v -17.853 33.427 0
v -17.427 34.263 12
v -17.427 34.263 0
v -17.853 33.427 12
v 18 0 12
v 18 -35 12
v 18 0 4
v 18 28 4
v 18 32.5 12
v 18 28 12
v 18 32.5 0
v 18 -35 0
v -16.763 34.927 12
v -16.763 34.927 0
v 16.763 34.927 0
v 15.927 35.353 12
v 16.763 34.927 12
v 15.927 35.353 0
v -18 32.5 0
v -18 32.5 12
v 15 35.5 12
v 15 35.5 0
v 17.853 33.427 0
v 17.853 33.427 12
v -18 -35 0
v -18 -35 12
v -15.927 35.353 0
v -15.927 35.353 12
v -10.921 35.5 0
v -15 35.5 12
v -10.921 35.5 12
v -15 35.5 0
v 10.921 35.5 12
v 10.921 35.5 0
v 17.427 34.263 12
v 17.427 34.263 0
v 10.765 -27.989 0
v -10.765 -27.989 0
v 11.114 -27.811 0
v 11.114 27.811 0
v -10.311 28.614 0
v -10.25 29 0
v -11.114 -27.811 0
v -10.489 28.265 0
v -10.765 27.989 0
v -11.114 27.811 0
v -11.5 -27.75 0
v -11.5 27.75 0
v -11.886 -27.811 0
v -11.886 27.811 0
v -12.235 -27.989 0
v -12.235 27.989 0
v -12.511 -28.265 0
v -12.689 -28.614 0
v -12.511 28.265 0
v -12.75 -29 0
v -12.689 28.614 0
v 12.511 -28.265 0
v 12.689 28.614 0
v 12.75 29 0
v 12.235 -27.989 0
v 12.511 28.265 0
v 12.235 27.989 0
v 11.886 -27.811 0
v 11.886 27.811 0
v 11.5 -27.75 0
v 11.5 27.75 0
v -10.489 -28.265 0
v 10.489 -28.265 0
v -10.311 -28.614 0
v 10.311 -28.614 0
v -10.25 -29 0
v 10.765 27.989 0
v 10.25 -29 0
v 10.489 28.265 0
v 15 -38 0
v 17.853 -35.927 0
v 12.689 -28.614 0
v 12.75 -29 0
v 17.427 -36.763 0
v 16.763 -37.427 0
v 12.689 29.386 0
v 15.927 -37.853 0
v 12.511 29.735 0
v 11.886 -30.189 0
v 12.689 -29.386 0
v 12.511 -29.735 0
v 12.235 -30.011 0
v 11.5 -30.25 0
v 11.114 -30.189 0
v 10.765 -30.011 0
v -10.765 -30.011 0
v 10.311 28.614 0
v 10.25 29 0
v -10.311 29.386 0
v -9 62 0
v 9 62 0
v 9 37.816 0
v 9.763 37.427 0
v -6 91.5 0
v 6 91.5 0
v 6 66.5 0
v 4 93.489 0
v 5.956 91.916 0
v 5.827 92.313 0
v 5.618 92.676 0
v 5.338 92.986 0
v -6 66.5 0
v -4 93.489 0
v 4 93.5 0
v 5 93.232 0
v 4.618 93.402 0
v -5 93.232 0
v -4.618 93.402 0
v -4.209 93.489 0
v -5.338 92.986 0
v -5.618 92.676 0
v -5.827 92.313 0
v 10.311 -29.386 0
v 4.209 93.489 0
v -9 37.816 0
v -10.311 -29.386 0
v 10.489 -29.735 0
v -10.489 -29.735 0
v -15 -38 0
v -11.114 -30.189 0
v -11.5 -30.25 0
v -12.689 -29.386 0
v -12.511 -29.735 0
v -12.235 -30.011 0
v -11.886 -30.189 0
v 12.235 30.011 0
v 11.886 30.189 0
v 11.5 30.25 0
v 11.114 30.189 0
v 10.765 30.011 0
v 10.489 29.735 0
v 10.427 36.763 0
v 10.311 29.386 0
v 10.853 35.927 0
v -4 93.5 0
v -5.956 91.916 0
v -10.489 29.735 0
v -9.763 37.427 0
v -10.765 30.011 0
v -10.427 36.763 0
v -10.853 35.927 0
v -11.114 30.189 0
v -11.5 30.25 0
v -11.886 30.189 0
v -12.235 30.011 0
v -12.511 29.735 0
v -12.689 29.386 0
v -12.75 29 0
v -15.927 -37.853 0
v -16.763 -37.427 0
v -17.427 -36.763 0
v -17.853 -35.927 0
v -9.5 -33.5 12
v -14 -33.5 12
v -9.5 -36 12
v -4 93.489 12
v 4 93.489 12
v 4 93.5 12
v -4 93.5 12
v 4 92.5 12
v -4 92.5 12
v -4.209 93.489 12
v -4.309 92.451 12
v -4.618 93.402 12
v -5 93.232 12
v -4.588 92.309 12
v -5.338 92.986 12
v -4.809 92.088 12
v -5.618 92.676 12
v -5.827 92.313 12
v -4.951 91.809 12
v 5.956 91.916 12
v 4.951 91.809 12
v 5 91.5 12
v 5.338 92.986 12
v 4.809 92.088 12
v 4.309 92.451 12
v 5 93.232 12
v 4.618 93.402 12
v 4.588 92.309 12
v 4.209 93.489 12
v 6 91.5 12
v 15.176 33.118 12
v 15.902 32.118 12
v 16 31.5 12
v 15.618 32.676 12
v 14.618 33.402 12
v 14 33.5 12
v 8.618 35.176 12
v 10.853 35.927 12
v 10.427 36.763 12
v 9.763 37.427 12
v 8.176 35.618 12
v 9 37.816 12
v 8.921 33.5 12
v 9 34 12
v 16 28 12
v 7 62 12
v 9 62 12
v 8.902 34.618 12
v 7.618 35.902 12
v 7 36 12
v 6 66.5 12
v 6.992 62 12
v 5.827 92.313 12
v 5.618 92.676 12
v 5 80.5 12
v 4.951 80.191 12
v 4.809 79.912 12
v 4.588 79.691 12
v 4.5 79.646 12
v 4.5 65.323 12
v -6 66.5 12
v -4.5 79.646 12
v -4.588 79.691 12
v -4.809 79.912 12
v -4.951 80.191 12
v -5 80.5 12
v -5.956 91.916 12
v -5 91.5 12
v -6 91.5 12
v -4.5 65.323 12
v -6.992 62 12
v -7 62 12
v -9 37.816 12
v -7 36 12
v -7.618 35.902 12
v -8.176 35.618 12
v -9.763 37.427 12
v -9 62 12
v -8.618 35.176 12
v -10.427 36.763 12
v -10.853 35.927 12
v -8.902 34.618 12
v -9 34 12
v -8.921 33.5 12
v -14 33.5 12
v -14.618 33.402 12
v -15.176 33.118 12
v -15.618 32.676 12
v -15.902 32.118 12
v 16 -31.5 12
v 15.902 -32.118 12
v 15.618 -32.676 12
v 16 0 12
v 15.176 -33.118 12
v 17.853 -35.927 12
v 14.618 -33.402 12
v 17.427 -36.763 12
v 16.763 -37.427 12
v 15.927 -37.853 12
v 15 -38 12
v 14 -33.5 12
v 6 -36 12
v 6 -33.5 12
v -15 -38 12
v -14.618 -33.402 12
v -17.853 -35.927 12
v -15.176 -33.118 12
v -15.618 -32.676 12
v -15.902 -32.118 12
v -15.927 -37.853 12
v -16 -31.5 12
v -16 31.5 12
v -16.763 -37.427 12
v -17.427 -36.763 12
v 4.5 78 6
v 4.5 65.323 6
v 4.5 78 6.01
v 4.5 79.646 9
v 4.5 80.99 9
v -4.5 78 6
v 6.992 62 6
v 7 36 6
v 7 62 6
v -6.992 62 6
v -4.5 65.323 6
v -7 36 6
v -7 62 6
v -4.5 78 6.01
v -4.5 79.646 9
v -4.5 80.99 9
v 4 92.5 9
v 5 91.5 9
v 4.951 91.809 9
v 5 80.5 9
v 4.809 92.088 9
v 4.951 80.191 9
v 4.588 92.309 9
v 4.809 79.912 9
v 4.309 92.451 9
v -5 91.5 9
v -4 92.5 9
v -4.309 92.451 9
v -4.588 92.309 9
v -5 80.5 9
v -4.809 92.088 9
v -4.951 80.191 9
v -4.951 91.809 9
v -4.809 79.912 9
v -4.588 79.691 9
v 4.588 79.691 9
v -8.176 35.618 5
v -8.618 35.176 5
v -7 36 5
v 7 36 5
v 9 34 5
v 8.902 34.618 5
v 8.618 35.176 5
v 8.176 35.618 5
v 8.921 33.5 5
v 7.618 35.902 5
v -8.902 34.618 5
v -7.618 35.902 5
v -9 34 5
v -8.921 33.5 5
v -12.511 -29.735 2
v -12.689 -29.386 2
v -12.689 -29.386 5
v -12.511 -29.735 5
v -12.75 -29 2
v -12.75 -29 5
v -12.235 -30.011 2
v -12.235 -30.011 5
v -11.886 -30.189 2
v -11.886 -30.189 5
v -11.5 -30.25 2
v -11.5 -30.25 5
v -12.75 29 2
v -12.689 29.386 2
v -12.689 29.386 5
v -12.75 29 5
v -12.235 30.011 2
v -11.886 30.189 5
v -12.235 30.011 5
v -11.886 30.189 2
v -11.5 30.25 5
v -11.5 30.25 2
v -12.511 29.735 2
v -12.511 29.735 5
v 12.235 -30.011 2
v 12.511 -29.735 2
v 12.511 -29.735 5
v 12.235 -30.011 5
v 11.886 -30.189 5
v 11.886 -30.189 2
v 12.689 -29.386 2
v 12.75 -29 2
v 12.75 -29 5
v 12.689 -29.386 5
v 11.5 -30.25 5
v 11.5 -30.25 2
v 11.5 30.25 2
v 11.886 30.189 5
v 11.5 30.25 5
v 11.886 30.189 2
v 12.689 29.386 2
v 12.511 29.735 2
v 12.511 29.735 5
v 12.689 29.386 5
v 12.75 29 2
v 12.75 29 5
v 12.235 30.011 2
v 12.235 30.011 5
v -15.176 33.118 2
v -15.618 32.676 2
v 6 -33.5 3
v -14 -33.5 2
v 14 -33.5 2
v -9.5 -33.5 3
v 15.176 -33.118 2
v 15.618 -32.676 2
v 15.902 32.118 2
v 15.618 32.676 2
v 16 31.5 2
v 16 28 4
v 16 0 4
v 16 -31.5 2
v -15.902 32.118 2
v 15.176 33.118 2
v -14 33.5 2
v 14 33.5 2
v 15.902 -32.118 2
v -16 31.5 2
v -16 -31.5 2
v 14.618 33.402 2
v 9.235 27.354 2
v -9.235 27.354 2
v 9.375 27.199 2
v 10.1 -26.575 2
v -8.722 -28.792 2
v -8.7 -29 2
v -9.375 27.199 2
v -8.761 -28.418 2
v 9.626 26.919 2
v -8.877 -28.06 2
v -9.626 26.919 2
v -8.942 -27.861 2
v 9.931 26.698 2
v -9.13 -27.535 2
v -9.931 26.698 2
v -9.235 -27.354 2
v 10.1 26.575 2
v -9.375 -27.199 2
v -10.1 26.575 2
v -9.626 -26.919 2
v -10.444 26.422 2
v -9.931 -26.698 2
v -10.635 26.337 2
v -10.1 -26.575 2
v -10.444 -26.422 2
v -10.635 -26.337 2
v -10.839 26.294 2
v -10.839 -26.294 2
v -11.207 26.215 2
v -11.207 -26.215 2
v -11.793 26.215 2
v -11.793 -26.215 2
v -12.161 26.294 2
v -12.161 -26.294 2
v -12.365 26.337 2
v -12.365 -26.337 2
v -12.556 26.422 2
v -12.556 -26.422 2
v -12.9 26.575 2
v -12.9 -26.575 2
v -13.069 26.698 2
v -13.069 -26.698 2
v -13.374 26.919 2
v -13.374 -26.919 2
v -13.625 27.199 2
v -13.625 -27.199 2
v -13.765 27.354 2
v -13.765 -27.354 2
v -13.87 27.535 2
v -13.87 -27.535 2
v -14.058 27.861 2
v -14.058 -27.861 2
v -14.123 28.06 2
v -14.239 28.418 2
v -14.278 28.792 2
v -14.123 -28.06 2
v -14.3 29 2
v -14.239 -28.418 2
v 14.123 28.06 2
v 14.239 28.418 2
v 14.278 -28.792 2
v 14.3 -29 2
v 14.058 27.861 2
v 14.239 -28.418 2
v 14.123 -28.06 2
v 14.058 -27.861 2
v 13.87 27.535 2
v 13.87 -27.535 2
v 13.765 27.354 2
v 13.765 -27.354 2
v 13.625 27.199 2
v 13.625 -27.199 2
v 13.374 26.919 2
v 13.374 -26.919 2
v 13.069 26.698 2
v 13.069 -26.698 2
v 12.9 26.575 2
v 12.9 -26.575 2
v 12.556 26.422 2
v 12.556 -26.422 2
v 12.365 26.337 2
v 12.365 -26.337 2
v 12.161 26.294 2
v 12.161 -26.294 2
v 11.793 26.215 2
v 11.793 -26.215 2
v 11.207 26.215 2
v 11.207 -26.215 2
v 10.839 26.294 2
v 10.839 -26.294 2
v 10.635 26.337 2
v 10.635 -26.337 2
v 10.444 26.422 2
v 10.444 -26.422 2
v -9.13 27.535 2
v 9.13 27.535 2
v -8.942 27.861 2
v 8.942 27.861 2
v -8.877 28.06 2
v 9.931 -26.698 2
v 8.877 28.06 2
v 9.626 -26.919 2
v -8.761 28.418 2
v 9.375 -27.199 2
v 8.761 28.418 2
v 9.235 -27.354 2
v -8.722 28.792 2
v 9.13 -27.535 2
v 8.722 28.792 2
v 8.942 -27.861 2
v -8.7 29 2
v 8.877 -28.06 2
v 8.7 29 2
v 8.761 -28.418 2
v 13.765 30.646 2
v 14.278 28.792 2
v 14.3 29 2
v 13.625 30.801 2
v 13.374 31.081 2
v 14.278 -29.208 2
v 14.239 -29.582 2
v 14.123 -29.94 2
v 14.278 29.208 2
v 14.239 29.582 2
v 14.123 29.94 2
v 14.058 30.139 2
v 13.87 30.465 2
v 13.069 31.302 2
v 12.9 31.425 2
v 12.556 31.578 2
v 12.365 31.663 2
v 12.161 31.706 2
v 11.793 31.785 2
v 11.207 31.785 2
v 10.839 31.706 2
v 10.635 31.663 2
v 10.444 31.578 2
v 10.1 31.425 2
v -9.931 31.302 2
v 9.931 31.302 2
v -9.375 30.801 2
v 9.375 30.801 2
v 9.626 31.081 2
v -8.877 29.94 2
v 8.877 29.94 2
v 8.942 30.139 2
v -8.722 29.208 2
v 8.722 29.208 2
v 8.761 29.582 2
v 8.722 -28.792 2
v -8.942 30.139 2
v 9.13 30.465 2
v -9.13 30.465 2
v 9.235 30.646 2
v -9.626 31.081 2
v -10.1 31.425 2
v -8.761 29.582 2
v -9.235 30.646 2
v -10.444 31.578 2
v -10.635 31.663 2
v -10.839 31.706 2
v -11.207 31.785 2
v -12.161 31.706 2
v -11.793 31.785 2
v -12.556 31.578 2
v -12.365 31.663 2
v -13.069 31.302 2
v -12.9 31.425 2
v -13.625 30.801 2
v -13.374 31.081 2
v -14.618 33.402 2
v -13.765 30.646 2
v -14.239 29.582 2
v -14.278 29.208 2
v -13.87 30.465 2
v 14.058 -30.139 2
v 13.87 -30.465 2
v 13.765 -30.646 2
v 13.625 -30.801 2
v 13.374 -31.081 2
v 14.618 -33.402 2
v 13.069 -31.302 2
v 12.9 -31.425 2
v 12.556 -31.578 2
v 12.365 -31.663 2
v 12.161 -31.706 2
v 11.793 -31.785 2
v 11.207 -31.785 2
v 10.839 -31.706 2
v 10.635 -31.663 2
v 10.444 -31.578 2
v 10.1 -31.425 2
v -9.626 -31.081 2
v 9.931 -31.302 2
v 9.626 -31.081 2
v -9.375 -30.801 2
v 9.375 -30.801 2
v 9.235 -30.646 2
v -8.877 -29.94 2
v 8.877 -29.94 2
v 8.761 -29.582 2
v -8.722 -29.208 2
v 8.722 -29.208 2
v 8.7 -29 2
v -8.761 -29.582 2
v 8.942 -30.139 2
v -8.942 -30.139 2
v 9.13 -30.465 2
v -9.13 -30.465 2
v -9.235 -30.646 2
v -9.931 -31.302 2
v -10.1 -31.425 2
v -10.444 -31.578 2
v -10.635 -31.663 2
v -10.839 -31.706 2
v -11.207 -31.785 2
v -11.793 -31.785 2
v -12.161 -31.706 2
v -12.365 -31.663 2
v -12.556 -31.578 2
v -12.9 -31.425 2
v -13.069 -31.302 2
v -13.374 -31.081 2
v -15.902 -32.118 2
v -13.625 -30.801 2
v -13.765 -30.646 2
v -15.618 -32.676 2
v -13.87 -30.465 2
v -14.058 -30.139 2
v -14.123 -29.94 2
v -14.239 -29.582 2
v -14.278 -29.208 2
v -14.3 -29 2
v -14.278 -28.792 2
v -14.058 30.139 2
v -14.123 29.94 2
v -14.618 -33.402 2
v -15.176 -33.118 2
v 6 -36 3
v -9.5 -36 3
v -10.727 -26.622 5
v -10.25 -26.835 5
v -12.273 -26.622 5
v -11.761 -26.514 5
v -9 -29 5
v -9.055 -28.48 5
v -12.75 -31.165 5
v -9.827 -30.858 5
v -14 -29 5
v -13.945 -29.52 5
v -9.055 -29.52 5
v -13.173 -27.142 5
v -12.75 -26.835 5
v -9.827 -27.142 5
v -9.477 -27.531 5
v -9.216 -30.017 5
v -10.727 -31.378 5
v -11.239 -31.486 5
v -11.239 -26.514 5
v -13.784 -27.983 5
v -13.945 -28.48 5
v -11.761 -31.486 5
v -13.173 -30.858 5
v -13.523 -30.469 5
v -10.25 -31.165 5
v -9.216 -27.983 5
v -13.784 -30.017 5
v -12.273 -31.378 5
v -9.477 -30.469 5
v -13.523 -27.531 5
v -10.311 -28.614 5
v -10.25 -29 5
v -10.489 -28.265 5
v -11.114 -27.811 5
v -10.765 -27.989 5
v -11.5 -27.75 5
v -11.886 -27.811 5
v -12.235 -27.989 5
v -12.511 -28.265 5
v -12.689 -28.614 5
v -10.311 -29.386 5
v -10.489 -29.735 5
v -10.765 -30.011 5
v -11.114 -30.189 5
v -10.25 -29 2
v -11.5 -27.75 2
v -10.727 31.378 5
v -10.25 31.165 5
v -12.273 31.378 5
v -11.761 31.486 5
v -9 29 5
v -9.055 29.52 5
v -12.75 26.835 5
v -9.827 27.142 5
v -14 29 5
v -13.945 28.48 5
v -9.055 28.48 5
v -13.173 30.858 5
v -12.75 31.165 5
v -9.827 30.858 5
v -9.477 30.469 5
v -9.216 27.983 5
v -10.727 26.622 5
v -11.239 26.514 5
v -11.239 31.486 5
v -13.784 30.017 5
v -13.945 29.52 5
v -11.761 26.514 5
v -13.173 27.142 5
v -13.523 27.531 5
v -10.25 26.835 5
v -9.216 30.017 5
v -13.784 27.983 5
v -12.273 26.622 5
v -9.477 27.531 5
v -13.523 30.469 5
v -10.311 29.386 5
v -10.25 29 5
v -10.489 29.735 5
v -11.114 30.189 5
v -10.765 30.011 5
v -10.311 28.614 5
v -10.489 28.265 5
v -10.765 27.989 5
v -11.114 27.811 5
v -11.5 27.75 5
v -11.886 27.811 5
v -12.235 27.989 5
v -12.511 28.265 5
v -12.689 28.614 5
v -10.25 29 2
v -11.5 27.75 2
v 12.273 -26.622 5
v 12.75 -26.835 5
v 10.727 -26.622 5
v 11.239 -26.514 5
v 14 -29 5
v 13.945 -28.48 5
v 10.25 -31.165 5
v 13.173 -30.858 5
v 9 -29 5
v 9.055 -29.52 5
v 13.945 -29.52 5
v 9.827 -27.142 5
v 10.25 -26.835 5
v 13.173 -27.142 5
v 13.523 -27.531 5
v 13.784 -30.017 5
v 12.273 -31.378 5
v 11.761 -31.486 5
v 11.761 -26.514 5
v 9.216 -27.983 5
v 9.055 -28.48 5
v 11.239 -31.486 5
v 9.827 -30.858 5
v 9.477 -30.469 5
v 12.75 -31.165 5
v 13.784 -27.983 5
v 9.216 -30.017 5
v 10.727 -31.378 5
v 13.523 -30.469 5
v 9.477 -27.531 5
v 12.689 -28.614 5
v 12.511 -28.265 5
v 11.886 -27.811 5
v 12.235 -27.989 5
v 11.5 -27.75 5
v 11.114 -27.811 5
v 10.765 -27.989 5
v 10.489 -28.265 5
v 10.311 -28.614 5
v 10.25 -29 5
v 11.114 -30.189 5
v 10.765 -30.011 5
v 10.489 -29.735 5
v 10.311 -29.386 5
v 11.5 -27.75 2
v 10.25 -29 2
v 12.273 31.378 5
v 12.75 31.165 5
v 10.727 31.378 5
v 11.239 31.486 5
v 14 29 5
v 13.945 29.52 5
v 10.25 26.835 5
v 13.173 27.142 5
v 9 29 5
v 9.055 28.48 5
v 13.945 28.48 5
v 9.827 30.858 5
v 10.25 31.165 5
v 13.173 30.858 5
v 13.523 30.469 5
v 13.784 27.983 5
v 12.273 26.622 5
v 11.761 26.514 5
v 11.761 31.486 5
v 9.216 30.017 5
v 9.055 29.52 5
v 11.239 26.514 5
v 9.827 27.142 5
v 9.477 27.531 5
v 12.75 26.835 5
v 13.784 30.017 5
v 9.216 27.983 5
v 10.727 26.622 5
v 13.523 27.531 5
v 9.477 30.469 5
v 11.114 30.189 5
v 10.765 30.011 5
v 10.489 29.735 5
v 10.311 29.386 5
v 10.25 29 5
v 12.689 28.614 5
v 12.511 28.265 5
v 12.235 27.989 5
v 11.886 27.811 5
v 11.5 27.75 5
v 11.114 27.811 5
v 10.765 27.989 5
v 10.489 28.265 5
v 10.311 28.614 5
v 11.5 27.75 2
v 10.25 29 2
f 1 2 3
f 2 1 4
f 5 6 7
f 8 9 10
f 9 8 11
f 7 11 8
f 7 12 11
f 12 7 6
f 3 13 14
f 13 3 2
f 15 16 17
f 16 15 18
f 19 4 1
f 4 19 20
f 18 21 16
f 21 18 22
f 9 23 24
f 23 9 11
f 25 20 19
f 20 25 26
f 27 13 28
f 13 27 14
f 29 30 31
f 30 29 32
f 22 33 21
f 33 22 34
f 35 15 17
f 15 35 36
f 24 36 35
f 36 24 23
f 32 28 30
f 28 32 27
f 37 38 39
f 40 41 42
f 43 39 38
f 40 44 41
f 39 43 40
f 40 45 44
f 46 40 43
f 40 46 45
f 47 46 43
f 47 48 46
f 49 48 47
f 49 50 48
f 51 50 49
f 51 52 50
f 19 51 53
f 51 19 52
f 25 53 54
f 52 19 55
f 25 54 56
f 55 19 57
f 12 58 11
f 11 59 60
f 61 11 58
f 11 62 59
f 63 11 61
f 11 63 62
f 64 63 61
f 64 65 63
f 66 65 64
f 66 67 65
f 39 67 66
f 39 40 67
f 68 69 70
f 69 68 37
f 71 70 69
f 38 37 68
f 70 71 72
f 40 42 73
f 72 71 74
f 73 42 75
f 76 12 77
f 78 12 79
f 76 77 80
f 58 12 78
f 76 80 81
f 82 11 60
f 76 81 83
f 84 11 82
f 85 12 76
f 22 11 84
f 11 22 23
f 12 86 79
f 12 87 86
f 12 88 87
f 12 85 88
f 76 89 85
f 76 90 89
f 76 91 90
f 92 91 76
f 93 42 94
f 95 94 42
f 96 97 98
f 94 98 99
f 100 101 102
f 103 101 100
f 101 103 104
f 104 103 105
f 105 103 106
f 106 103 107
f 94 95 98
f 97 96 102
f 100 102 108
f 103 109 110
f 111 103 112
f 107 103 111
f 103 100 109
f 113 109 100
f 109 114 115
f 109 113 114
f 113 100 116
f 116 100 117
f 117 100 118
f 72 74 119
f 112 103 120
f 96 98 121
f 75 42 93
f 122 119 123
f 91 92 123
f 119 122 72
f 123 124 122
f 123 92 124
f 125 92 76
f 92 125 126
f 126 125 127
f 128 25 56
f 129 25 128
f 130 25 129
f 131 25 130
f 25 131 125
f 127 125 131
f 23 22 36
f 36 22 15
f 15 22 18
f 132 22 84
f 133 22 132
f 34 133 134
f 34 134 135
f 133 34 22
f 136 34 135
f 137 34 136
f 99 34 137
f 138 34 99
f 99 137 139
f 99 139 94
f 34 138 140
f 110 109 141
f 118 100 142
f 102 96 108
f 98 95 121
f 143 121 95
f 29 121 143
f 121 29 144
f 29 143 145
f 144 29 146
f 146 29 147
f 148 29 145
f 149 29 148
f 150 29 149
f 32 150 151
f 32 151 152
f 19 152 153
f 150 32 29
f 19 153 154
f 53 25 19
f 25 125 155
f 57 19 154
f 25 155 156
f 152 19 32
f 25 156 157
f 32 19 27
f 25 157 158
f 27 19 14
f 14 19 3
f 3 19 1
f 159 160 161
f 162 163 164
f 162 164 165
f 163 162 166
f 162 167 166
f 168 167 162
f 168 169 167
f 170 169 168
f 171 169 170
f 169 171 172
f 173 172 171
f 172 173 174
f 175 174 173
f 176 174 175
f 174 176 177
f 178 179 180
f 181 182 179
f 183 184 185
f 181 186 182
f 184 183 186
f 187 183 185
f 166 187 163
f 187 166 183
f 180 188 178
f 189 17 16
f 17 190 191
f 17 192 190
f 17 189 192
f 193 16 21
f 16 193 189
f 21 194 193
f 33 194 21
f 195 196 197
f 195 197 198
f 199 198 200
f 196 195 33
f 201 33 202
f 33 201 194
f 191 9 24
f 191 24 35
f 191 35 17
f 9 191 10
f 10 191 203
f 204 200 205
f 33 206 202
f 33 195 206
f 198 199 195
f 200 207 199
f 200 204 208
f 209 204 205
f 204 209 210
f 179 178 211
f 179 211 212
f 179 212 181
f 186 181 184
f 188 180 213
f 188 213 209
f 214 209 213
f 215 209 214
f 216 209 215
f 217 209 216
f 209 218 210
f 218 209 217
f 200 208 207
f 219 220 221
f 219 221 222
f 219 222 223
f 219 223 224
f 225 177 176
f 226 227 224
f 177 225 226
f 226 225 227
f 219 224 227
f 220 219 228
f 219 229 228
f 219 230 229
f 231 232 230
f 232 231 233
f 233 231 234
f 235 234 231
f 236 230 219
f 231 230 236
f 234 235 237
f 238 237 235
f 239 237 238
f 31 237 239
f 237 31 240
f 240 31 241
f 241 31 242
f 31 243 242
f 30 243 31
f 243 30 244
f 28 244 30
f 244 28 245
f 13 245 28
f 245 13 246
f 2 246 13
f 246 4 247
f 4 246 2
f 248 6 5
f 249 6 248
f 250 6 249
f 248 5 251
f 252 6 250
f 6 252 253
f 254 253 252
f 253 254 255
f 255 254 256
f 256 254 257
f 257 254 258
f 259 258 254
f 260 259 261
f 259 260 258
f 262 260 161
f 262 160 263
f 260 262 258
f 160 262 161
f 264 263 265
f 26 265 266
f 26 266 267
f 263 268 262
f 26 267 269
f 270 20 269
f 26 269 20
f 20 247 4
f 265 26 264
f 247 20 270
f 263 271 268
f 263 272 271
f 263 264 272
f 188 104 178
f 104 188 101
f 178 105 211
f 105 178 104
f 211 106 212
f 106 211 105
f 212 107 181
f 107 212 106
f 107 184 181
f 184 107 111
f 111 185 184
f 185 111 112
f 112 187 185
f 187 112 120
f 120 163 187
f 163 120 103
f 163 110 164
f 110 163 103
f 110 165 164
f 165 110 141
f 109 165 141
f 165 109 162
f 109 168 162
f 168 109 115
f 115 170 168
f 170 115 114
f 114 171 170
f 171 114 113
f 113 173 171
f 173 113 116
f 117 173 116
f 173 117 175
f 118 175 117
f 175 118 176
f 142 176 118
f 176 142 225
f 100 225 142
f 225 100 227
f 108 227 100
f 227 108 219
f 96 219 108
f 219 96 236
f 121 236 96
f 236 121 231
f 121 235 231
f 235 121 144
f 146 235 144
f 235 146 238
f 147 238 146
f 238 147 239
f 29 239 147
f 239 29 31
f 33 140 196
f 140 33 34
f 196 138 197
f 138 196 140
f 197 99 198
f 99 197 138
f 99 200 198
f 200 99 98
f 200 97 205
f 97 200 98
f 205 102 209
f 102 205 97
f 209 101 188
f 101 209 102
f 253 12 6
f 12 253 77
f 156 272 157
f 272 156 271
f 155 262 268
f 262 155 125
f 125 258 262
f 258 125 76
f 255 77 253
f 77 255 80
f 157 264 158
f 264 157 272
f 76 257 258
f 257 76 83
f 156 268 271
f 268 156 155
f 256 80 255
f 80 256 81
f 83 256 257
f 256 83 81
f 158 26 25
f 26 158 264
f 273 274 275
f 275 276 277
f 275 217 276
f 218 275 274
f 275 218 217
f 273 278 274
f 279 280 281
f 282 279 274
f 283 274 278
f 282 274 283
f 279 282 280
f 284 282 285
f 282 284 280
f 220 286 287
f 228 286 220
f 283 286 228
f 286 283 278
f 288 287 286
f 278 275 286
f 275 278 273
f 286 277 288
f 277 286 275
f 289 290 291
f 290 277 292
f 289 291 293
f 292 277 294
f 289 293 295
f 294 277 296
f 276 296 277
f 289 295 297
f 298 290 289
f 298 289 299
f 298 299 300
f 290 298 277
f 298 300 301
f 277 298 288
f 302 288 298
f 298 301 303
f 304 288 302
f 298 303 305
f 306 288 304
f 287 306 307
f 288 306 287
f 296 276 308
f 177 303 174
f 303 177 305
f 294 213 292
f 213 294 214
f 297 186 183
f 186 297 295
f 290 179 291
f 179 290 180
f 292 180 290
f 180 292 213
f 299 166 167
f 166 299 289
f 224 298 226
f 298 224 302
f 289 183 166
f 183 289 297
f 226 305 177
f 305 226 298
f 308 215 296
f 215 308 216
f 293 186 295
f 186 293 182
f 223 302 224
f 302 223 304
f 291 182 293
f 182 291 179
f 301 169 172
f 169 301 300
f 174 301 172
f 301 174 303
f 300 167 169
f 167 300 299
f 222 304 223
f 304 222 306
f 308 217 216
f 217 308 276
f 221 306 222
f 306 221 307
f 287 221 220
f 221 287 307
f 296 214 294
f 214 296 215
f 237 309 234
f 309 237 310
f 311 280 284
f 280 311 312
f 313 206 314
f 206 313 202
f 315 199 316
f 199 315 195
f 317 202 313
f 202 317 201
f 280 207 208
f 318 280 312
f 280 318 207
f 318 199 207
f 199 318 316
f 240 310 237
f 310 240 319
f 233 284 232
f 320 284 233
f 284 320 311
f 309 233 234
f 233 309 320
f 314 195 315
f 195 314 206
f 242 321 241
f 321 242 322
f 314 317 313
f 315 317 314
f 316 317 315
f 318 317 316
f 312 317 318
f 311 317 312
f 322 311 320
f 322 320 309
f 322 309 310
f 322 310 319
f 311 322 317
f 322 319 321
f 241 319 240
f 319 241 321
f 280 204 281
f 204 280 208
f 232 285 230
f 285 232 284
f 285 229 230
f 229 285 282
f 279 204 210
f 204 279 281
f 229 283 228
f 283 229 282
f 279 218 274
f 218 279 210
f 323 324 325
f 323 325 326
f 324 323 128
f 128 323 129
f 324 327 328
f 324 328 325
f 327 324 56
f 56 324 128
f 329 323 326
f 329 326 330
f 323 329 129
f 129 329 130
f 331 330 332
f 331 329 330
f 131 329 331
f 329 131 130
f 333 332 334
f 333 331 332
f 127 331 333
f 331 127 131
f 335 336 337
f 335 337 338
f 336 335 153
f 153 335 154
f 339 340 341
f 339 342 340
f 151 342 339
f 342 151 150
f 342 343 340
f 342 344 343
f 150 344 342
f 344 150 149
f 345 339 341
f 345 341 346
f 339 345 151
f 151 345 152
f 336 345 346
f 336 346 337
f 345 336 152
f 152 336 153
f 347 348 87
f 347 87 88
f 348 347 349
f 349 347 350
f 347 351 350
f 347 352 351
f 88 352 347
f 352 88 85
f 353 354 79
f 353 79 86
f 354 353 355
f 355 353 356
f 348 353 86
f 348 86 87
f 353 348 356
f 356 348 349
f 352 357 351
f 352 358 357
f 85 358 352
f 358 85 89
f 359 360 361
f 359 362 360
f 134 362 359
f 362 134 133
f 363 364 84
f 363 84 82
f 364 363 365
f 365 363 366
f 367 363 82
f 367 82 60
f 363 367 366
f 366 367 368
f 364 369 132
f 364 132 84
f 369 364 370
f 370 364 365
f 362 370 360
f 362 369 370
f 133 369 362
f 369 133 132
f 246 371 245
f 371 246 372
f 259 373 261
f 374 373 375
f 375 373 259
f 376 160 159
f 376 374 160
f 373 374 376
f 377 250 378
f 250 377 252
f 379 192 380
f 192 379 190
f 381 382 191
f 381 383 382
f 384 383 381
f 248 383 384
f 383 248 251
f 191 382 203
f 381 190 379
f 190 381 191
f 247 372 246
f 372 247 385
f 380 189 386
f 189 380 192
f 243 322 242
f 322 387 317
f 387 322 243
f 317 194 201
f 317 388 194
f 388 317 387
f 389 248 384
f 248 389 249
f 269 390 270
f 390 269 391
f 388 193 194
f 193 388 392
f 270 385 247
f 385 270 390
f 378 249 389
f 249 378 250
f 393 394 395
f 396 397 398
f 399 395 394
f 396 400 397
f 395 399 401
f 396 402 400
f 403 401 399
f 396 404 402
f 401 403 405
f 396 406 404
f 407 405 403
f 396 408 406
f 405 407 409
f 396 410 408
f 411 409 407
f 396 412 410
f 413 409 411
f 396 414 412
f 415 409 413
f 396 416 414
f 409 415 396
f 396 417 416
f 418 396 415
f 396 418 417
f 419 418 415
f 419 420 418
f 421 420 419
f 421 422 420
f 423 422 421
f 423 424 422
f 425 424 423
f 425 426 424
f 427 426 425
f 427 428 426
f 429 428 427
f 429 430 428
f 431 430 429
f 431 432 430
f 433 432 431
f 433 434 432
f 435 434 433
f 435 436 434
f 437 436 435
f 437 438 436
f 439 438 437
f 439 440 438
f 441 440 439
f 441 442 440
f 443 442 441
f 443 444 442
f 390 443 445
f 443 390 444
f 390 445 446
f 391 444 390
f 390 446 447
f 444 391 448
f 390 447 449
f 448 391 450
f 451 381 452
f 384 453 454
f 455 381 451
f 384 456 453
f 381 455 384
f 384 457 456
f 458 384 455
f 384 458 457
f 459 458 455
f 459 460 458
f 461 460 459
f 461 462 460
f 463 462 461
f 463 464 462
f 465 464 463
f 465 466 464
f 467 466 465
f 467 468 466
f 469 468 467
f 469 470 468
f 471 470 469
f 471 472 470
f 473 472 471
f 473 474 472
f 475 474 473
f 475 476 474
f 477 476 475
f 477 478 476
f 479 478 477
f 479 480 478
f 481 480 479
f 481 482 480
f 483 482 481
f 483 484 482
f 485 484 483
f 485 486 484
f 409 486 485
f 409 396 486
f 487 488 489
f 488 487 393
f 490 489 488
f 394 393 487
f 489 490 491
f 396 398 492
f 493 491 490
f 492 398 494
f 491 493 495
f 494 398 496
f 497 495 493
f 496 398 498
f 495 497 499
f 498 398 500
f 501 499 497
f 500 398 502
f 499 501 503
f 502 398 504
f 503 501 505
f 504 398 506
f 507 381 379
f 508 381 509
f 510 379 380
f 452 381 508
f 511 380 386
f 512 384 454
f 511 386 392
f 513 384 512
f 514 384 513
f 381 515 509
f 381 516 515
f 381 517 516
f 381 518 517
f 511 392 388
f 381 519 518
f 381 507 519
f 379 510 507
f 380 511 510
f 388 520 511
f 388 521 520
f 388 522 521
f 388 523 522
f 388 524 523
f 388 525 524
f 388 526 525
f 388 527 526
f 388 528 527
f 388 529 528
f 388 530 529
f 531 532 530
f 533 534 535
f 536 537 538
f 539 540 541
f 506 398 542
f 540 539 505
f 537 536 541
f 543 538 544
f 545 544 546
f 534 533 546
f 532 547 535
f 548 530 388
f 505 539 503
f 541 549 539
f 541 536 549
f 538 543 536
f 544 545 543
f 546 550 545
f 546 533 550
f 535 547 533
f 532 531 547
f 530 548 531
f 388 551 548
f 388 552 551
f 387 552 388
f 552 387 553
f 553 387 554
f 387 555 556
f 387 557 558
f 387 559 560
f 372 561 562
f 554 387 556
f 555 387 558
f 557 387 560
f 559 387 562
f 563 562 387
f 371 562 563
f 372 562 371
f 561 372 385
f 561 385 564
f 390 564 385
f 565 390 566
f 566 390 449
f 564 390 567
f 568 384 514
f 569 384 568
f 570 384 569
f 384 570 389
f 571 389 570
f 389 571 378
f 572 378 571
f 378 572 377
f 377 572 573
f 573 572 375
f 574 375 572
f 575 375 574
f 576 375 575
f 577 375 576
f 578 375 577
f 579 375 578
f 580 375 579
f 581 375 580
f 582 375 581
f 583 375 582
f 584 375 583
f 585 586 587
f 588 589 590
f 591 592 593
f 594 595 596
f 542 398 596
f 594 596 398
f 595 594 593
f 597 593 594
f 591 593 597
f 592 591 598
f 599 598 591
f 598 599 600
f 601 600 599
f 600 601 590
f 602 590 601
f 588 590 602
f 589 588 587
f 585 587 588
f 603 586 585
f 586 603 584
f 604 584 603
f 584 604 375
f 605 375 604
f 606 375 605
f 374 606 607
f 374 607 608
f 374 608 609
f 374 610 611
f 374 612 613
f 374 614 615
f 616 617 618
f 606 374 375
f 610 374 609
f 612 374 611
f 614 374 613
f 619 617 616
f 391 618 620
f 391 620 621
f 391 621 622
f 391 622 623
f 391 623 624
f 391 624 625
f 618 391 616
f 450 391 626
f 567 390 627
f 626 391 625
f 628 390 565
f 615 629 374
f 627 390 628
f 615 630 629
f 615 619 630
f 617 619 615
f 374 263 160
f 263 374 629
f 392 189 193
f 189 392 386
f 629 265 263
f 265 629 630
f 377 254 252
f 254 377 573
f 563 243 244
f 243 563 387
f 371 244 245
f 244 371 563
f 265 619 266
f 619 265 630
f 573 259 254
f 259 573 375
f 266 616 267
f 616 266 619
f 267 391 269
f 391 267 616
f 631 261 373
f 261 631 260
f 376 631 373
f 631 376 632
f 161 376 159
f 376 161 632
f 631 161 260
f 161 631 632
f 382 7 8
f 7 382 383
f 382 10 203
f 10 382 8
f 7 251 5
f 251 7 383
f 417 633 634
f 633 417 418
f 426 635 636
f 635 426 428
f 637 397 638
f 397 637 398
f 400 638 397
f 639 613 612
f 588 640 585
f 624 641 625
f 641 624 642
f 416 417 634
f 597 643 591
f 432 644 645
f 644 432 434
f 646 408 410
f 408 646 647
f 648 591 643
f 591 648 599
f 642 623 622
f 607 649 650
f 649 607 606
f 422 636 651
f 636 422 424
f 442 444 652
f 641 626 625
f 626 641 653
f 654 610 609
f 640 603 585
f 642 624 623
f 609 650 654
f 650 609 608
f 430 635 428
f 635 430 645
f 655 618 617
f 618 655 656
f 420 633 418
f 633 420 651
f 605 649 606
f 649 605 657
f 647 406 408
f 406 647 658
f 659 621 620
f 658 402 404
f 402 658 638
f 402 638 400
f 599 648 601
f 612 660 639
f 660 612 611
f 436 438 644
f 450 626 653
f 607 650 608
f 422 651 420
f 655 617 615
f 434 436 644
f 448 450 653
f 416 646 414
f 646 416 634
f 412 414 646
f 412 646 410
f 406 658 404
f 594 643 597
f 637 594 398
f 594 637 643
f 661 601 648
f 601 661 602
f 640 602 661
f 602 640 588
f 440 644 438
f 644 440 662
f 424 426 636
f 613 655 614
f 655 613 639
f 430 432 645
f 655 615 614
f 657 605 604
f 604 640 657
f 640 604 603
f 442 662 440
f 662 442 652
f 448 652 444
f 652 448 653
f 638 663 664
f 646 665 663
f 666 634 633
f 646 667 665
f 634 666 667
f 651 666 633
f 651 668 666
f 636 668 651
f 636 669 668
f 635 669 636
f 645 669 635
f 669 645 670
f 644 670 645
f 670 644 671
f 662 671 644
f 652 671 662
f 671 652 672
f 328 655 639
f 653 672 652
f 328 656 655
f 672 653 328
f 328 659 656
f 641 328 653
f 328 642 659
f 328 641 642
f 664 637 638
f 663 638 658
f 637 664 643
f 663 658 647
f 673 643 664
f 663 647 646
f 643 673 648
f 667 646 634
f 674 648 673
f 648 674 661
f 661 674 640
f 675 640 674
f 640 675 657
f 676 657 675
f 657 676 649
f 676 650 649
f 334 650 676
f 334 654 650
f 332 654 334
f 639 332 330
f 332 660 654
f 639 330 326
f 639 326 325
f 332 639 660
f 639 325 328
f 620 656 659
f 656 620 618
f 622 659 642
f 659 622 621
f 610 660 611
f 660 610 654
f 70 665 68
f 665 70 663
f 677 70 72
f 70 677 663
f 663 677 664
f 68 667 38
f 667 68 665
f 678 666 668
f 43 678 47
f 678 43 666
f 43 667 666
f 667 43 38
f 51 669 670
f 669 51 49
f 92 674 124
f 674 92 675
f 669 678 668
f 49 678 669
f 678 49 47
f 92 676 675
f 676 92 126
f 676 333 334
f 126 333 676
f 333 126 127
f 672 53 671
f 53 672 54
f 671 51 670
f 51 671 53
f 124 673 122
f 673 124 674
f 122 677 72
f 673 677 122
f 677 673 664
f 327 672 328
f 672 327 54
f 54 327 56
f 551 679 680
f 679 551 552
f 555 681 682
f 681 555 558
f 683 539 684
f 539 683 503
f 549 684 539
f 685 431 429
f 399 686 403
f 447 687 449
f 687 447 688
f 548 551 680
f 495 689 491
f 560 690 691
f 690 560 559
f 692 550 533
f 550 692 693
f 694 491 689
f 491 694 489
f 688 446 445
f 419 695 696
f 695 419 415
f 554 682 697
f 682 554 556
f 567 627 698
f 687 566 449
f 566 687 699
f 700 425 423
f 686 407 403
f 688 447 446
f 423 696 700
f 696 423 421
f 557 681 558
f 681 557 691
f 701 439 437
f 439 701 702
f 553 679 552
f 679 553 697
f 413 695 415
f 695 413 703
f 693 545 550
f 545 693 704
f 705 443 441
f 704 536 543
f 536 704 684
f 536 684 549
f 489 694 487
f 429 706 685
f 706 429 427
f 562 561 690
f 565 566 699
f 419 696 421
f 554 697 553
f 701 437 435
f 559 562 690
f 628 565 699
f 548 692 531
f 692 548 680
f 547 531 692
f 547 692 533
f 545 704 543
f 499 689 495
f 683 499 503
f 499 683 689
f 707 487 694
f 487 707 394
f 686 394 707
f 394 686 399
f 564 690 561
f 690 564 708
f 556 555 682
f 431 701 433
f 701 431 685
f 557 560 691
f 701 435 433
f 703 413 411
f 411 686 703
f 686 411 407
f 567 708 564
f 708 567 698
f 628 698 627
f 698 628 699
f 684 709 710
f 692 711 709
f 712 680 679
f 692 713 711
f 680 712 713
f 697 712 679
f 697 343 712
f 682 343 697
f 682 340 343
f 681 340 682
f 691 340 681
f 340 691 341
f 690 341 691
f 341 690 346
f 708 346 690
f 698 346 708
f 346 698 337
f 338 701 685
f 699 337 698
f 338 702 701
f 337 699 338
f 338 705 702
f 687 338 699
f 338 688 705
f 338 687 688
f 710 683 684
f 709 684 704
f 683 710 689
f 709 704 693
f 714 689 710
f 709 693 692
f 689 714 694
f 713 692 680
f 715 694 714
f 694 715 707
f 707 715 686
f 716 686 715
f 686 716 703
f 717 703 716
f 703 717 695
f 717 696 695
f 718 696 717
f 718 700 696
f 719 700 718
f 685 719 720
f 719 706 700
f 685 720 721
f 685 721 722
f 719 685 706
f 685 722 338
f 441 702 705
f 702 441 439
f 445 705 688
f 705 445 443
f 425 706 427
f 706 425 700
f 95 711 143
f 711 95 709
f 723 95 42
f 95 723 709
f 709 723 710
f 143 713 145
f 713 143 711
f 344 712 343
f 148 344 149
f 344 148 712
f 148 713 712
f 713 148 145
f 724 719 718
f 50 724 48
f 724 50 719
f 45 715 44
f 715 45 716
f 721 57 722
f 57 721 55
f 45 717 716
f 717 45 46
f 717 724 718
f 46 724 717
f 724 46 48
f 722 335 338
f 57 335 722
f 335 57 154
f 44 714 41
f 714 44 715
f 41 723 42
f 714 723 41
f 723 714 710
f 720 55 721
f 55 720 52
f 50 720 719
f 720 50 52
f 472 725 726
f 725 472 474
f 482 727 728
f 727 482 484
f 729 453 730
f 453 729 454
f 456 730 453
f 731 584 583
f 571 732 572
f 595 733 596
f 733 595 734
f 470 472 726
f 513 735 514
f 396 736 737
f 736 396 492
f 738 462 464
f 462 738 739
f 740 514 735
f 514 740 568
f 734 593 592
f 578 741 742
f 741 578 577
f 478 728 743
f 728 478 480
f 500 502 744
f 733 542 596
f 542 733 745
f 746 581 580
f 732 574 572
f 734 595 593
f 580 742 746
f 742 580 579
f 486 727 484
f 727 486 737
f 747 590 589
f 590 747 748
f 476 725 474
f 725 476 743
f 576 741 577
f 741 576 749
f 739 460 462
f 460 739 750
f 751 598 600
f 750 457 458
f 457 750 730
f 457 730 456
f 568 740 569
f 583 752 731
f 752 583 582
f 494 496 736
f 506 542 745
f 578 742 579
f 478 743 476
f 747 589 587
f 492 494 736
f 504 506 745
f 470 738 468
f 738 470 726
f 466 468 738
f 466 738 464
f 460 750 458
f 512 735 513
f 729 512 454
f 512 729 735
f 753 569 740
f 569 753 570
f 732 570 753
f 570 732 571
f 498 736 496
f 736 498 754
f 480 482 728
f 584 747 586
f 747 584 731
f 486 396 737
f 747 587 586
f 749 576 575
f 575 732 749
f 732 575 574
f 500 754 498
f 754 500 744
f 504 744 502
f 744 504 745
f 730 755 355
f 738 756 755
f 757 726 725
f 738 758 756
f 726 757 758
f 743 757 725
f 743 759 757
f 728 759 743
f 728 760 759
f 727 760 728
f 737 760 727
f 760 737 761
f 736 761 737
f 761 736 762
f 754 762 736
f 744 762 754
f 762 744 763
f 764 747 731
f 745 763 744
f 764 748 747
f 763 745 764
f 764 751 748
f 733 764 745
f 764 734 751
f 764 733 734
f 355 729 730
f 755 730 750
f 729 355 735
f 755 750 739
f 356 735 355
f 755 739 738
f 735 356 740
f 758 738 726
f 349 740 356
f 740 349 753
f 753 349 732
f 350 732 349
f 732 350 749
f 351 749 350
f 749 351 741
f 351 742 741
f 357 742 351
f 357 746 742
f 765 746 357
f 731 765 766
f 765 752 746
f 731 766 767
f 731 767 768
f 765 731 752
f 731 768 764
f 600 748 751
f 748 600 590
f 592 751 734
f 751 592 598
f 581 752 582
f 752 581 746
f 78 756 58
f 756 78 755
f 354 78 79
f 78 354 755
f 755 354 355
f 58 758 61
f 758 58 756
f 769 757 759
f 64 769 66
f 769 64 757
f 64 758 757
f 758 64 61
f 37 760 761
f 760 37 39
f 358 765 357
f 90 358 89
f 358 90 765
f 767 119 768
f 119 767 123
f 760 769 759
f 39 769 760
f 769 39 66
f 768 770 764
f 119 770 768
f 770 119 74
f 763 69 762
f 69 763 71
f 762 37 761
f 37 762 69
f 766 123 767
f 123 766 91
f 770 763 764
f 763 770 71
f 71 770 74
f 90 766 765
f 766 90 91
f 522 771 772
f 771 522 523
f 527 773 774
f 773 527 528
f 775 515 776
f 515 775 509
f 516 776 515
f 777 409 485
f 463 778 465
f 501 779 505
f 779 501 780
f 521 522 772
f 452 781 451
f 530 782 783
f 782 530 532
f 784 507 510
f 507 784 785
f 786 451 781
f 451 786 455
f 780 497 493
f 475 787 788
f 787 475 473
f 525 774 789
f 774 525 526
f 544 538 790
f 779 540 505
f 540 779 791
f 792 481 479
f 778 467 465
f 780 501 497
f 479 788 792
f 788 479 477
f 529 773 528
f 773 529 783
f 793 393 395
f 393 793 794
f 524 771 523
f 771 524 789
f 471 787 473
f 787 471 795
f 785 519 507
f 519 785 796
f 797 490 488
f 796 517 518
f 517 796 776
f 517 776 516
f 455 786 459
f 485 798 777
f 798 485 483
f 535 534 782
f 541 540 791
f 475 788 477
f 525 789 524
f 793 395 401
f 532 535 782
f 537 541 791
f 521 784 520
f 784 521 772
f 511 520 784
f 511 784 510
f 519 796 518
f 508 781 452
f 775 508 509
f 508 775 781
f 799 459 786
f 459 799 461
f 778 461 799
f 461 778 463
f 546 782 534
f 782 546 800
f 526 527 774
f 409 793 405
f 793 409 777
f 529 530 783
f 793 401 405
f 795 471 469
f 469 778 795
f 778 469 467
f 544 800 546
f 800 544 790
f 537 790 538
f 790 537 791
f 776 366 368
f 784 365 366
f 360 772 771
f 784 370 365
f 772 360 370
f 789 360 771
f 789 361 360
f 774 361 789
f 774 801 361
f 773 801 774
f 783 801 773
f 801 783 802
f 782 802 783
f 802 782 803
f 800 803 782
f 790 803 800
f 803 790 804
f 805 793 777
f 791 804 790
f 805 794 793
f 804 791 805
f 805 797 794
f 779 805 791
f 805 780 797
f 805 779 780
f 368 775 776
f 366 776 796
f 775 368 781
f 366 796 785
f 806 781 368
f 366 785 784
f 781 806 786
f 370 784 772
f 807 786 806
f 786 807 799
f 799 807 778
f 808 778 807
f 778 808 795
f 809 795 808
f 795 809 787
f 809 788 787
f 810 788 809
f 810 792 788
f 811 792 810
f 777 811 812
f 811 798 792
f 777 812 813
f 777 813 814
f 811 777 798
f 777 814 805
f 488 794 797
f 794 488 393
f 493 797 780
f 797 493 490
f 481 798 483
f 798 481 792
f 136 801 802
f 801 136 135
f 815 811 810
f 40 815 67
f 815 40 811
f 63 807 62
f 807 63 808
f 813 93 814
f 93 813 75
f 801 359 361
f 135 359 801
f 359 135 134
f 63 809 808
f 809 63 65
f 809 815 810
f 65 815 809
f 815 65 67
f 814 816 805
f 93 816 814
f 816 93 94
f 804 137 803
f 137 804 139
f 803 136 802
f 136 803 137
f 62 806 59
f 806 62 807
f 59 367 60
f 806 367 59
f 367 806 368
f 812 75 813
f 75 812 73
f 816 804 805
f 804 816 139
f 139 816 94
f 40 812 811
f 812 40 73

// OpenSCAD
// file: Battery.scad
if(!part) {
part="pack";
battery_type="AA";
cols=4;

size_18650=[18,65];
size_aa=[14.5,50.5];
size_aaa=[10.5,44.5];
batsize=battery_type=="aaa"?size_aaa:(battery_type=="AA"?size_aa:size_18650);

if(part=="pack"||part=="all")
  pack(cols,battery_type);
if(part=="cap"||part=="all")
  rotate([part=="cap"?180:0,0]) cap(cols,battery_type);
if(part=="both")
{
  mirror([0,1]) mirror([1,0]) translate([5,0,battery_width(battery_type)+4]) rotate([180,0]) cap(cols,battery_type);
  translate([0,0]) pack(cols,battery_type);
}
}

module cap(cols,battery_type="18650") {
  dx=battery_width(battery_type)+1;
  dy=battery_length(battery_type)+10;
  dz=battery_width(battery_type)+2;
  difference(){
    intersection() {
      translate([-4,-4,dz-5.5]) cube([10+cols*dx,dy+8,10]);
      union() {
        translate([0,0,dz+.4]) cube([2+cols*dx,dy,1.6]);
        *mirrory(dy/2) translate([1,-2,dz-8]) cube([6+cols*dx,1.2,10]);
        mirrorx((cols*dx+2)/2) {
          translate([2,3.5,dz-8]) cube([dx*cols/2,dy-7,10]);
          mirrory(dy/2) translate([2.5,10.4,dz-4.5]) rotate([-90,0]) cylinder(d=3.8,h=8.4,$fn=30);
        }
        translate([2,1.5,dz-3.2]) cube([dx*cols-2,dy-3,4.5]);
        *for(x=[0:cols-1])
  translate([1+dx/2+dx*x,3,dz/2]) {
    rotate([-90,0]) translate([-4,dx/-2-2,-1.5]) cube([8,5,dy-3]);
  }
      }
    }
  for(x=[0:cols-1])
  translate([1+dx/2+dx*x,3,dz/2]) {
    rotate([-90,0]) cylinder(d=dx,h=dy-6,$fn=40);
  }
  }
}
module pack(cols=4,battery_type="18650") {
dx=battery_width(battery_type)+1;
dy=battery_length(battery_type)+10;
dz=battery_width(battery_type)+2;
difference(){
  cube([2+cols*dx,dy,dz]);
  for(x=[0:cols-1])
  translate([1+dx/2+dx*x,3,dz/2]) {
    rotate([-90,0]) battery(battery_type);
  }
  mirrorx((2+cols*dx)/2) mirrory(dy/2) translate([2.5,10,dz-4]) rotate([-90,0]) cylinder(d=4,h=10,$fn=30);
  translate([2,3,10]) cube([dx*cols-2,dy-6,dz]);
  translate([1.3,1.3,dz-5.99]) cube([dx*cols-.55,dy-2.6,6]);
}
}

function battery_length(type="18650") = (type=="18650"?65:(type=="AA"?50.5:(type=="AAA"?44.5:0)));
function battery_width(type="18650") = (type=="18650"?18:(type=="AA"?14.5:(type=="AAA"?10.5:0)));
module battery(type="18650",neg=1,top=0,side=0)
{
  noff=neg?4:0;
  dia=battery_width(type);
  length=battery_length(type);
  //if(type=="18650")
    {
    difference() {
      union() {
        cylinder(d=dia+(neg?0.5:0),h=length+noff,$fn=40);
        translate([dia*-.5-(neg?0.25:0),-11]) cube([dia+(neg?0.5:0),11,length+noff]);
        if(neg)
        {
          for(m=[0,1]) translate([0,0,m?length+noff:0]) mirror([0,0,m]) {
            rotate([0,0,m&&side?90*side:0])
              terminal_slot(top);
          }
        } else
        translate([0,0,length-.01+noff]) cylinder(d=dia/3,h=1.4,$fn=20);
      }
      mirrorz((length+noff)/2) translate([0,0,-3]) scale([1,1,0.5]) sphere(d=dia*.5,$fn=30);
    }
  }
}
module terminal_slot(top=0)
{
  translate([-5,-10.02,-1.7]) cube([10,17,1]);
  if(top)
    translate([-5.5,-6,-1.7]) cube([11.02,4,1]);
  translate([0,0,-.71]) {
    cylinder(d=8,h=2.02,$fn=30);
    translate([-4,-10.01]) cube([8,10,2.02]);
    translate([-5,-14.01]) cube([10,14,2.02]);
    translate([-8,-18,-1]) cube([16,14,2.02]);
  }
  translate([-3,1,-1.7]) cube([6,10,1]);
  translate([-1,-5,-1.2]) cube([2,10,2]);
  *translate([-3,8.01,-3.01]) cube([6,2,37.52]);
}

module mirrorz(offset=0)
{
  translate([0,0,offset]) for(m=[0,1]) mirror([0,0,m]) translate([0,0,offset*-1]) children();
}
module mirrory(offset=0)
{
  translate([0,offset,0]) for(m=[0,1]) mirror([0,m,0]) translate([0,offset*-1,0]) children();
}
module mirrorx(offset=0)
{
  translate([offset,0]) for(m=[0,1]) mirror([m,0]) translate([offset*-1,0]) children();
}
// main file
*translate([36.5,-79,2.5]) import("Raspberry_Pi_Zero_Case_-_Snapfit_Screwless_inc._camera_slot/files/Pi_Zero_Case_V4_inc_Camera_Slot.stl");
th=12;
long=1;
wrap=0;
part="base";
longy1=30;
longy2=59;
usb_access=1;
include<Battery.scad>;

if(part=="all")
  lid();
if(part=="base"||part=="all"||part=="all2"||part=="combo") base();
if(part=="lid"||part=="all2") translate([40,0,th+2]) rotate([0,180,0]) lid();
if(part=="combo")
{
  translate([-18,-30]) rotate([0,0,90]) pack(4,"AA");
}
module lid() {
  difference(){
    union(){
      translate([-18,-35.5,th]) cube2([36,71,2],3);
      if(wrap)
        translate([-12,32,th]) cube2([24,6,2]);
      else if(long) {
        translate([-12,32,th])
          linear_extrude(2,convexity=10) {
            long_profile();
          }
          translate([-4,longy2+10,th-3]) difference() {
            cube([8,8,3]);
            translate([-1,20]) rotate([135,0]) cube(10);
          }
        }
      translate([-18,-38,th]) cube2([36,8,2],3);
      for(x=[-11.5,11.5],y=[-29,29]) translate([x,y,th-5])  cylinder(d1=5,d2=6,h=5,$fn=30);
    }
    for(x=[-11.5,11.5],y=[-29,29]) translate([x,y,th-5.01]) {
      cylinder(d=2.5,h=6.02,$fn=20);
      translate([0,0,6]) cylinder(d1=2.5,d2=2.5,h=1.99,$fn=30);
    }
    translate([-12.5,-24,th-.01]) cylinder(d=3,h=5,$fn=30);
    if(long)
      translate([0,longy2+28,th-.01]) {
        cylinder(d=7,h=5,$fn=50);
        translate([-4.5,-4.5]) cube([9,9,1]);
      }
  }
  translate([-8,-35,th-4]) cube([12.5,2,5]);
  if(!long)
  translate([-8.5+(wrap?0:1.7),33,th-2]) cube([17-(wrap?0:3.4),2+(wrap?0:.5),3]);
  translate([14,1,th-3]) cube([2.5+(usb_access?1.5:0),25,3]);
  translate([-10,31,th-3]) cube([20,2,3]);
  translate([14,-20,th-3]) cube([2,40,3]);
  translate([-15.5,-20,th-3]) cube([2,40,3]);
}
module long_profile()
{
  translate([6,0]) square([12,longy2+.5]);
  translate([8,longy2+.5]) circle(d=4,$fn=30);
  translate([16,longy2+.5]) circle(d=4,$fn=30);
  translate([8,longy2-.5]) square([8,3]);
  translate([3,0]) square([18,longy1]);
  *translate([1,0]) square([22,longy1]);
  *translate([4,longy1]) circle(r=3,$fn=20);
  *translate([20,longy1]) circle(r=3,$fn=20);
  translate([4,3]) circle(r=3,$fn=20);
  translate([20,3]) circle(r=3,$fn=20);
  translate([1,longy1]) polygon([[2,0],[6,6],[16,6],[20,0]]);
}
module base() {
union(){
  difference(){
    union(){
      translate([-18,-35.5]) cube2([36,71,th],r=3);
      translate([-12,32])
        if(long)
          linear_extrude(th,convexity=10) long_profile();
        else if(wrap)
          cube2([24,6,th]);
      translate([-18,-38]) cube2([36,10,th],3);
    }
    translate([-16,-33.5,2]) cube2([32,67,th],2);
    //translate([
    translate([-9.5,-36,3]) cube([15.5,4,th]);
    translate([-9,32,6])
      if(long)
      {
        translate([0,0,-1]) cube2([18,4,th],2);
        translate([2,2]) cube([14,longy1-2,th],2);
        translate([0,longy1-.01]) linear_extrude(th) polygon([[2,0],[5,4],[13,4],[16,0]]);
        translate([4.5,longy1]) {
          translate([0,0,0]) cube([9,16,th],2);
          translate([0,15.99]) rotate([45,0]) cube([9,10,10]);
          translate([0,15.99,3]) cube([9,6,th]);
          translate([-.5,17.5,3]) cube2([10,longy2-longy1-16,th]);
        }
      }
      else if(wrap)
        cube([18,4,th]);
      else
        translate([2,0,3]) cube([14,4,th-5]);
    if(!long&&wrap) {
    translate([-4.5,-18.5,1.4]) cube([9,9,2]);
    translate([0,-14,-.01]) cylinder(d=7.5,h=2.02,$fn=30);
    translate([-5,5,1]) cube([10,26,2]);
    }
    translate([13,0,4]) cube([4+(usb_access?2:0),28,th]);
    for(x=[-11.5,11.5],y=[-29,29]) translate([x,y])       translate([0,0,-.01]) cylinder(d=2.5,h=4,$fn=20);
  }
  for(x=[-11.5,11.5],y=[-29,29]) translate([x,y]) difference(){
    cylinder(d1=6,d2=5,h=5,$fn=30);
    translate([0,0,-.01]) cylinder(d=2.5,h=6,$fn=20);
  }
}
}

module cube2(dims,r=1)
{
  linear_extrude(dims[2]) {
    translate([r,0]) square([dims[0]-r*2,dims[1]]);
    translate([0,r]) square([dims[0],dims[1]-r*2]);
    for(x=[r,dims[0]-r],y=[r,dims[1]-r])
      translate([x,y]) circle(r=r,$fn=20);
  }
}
